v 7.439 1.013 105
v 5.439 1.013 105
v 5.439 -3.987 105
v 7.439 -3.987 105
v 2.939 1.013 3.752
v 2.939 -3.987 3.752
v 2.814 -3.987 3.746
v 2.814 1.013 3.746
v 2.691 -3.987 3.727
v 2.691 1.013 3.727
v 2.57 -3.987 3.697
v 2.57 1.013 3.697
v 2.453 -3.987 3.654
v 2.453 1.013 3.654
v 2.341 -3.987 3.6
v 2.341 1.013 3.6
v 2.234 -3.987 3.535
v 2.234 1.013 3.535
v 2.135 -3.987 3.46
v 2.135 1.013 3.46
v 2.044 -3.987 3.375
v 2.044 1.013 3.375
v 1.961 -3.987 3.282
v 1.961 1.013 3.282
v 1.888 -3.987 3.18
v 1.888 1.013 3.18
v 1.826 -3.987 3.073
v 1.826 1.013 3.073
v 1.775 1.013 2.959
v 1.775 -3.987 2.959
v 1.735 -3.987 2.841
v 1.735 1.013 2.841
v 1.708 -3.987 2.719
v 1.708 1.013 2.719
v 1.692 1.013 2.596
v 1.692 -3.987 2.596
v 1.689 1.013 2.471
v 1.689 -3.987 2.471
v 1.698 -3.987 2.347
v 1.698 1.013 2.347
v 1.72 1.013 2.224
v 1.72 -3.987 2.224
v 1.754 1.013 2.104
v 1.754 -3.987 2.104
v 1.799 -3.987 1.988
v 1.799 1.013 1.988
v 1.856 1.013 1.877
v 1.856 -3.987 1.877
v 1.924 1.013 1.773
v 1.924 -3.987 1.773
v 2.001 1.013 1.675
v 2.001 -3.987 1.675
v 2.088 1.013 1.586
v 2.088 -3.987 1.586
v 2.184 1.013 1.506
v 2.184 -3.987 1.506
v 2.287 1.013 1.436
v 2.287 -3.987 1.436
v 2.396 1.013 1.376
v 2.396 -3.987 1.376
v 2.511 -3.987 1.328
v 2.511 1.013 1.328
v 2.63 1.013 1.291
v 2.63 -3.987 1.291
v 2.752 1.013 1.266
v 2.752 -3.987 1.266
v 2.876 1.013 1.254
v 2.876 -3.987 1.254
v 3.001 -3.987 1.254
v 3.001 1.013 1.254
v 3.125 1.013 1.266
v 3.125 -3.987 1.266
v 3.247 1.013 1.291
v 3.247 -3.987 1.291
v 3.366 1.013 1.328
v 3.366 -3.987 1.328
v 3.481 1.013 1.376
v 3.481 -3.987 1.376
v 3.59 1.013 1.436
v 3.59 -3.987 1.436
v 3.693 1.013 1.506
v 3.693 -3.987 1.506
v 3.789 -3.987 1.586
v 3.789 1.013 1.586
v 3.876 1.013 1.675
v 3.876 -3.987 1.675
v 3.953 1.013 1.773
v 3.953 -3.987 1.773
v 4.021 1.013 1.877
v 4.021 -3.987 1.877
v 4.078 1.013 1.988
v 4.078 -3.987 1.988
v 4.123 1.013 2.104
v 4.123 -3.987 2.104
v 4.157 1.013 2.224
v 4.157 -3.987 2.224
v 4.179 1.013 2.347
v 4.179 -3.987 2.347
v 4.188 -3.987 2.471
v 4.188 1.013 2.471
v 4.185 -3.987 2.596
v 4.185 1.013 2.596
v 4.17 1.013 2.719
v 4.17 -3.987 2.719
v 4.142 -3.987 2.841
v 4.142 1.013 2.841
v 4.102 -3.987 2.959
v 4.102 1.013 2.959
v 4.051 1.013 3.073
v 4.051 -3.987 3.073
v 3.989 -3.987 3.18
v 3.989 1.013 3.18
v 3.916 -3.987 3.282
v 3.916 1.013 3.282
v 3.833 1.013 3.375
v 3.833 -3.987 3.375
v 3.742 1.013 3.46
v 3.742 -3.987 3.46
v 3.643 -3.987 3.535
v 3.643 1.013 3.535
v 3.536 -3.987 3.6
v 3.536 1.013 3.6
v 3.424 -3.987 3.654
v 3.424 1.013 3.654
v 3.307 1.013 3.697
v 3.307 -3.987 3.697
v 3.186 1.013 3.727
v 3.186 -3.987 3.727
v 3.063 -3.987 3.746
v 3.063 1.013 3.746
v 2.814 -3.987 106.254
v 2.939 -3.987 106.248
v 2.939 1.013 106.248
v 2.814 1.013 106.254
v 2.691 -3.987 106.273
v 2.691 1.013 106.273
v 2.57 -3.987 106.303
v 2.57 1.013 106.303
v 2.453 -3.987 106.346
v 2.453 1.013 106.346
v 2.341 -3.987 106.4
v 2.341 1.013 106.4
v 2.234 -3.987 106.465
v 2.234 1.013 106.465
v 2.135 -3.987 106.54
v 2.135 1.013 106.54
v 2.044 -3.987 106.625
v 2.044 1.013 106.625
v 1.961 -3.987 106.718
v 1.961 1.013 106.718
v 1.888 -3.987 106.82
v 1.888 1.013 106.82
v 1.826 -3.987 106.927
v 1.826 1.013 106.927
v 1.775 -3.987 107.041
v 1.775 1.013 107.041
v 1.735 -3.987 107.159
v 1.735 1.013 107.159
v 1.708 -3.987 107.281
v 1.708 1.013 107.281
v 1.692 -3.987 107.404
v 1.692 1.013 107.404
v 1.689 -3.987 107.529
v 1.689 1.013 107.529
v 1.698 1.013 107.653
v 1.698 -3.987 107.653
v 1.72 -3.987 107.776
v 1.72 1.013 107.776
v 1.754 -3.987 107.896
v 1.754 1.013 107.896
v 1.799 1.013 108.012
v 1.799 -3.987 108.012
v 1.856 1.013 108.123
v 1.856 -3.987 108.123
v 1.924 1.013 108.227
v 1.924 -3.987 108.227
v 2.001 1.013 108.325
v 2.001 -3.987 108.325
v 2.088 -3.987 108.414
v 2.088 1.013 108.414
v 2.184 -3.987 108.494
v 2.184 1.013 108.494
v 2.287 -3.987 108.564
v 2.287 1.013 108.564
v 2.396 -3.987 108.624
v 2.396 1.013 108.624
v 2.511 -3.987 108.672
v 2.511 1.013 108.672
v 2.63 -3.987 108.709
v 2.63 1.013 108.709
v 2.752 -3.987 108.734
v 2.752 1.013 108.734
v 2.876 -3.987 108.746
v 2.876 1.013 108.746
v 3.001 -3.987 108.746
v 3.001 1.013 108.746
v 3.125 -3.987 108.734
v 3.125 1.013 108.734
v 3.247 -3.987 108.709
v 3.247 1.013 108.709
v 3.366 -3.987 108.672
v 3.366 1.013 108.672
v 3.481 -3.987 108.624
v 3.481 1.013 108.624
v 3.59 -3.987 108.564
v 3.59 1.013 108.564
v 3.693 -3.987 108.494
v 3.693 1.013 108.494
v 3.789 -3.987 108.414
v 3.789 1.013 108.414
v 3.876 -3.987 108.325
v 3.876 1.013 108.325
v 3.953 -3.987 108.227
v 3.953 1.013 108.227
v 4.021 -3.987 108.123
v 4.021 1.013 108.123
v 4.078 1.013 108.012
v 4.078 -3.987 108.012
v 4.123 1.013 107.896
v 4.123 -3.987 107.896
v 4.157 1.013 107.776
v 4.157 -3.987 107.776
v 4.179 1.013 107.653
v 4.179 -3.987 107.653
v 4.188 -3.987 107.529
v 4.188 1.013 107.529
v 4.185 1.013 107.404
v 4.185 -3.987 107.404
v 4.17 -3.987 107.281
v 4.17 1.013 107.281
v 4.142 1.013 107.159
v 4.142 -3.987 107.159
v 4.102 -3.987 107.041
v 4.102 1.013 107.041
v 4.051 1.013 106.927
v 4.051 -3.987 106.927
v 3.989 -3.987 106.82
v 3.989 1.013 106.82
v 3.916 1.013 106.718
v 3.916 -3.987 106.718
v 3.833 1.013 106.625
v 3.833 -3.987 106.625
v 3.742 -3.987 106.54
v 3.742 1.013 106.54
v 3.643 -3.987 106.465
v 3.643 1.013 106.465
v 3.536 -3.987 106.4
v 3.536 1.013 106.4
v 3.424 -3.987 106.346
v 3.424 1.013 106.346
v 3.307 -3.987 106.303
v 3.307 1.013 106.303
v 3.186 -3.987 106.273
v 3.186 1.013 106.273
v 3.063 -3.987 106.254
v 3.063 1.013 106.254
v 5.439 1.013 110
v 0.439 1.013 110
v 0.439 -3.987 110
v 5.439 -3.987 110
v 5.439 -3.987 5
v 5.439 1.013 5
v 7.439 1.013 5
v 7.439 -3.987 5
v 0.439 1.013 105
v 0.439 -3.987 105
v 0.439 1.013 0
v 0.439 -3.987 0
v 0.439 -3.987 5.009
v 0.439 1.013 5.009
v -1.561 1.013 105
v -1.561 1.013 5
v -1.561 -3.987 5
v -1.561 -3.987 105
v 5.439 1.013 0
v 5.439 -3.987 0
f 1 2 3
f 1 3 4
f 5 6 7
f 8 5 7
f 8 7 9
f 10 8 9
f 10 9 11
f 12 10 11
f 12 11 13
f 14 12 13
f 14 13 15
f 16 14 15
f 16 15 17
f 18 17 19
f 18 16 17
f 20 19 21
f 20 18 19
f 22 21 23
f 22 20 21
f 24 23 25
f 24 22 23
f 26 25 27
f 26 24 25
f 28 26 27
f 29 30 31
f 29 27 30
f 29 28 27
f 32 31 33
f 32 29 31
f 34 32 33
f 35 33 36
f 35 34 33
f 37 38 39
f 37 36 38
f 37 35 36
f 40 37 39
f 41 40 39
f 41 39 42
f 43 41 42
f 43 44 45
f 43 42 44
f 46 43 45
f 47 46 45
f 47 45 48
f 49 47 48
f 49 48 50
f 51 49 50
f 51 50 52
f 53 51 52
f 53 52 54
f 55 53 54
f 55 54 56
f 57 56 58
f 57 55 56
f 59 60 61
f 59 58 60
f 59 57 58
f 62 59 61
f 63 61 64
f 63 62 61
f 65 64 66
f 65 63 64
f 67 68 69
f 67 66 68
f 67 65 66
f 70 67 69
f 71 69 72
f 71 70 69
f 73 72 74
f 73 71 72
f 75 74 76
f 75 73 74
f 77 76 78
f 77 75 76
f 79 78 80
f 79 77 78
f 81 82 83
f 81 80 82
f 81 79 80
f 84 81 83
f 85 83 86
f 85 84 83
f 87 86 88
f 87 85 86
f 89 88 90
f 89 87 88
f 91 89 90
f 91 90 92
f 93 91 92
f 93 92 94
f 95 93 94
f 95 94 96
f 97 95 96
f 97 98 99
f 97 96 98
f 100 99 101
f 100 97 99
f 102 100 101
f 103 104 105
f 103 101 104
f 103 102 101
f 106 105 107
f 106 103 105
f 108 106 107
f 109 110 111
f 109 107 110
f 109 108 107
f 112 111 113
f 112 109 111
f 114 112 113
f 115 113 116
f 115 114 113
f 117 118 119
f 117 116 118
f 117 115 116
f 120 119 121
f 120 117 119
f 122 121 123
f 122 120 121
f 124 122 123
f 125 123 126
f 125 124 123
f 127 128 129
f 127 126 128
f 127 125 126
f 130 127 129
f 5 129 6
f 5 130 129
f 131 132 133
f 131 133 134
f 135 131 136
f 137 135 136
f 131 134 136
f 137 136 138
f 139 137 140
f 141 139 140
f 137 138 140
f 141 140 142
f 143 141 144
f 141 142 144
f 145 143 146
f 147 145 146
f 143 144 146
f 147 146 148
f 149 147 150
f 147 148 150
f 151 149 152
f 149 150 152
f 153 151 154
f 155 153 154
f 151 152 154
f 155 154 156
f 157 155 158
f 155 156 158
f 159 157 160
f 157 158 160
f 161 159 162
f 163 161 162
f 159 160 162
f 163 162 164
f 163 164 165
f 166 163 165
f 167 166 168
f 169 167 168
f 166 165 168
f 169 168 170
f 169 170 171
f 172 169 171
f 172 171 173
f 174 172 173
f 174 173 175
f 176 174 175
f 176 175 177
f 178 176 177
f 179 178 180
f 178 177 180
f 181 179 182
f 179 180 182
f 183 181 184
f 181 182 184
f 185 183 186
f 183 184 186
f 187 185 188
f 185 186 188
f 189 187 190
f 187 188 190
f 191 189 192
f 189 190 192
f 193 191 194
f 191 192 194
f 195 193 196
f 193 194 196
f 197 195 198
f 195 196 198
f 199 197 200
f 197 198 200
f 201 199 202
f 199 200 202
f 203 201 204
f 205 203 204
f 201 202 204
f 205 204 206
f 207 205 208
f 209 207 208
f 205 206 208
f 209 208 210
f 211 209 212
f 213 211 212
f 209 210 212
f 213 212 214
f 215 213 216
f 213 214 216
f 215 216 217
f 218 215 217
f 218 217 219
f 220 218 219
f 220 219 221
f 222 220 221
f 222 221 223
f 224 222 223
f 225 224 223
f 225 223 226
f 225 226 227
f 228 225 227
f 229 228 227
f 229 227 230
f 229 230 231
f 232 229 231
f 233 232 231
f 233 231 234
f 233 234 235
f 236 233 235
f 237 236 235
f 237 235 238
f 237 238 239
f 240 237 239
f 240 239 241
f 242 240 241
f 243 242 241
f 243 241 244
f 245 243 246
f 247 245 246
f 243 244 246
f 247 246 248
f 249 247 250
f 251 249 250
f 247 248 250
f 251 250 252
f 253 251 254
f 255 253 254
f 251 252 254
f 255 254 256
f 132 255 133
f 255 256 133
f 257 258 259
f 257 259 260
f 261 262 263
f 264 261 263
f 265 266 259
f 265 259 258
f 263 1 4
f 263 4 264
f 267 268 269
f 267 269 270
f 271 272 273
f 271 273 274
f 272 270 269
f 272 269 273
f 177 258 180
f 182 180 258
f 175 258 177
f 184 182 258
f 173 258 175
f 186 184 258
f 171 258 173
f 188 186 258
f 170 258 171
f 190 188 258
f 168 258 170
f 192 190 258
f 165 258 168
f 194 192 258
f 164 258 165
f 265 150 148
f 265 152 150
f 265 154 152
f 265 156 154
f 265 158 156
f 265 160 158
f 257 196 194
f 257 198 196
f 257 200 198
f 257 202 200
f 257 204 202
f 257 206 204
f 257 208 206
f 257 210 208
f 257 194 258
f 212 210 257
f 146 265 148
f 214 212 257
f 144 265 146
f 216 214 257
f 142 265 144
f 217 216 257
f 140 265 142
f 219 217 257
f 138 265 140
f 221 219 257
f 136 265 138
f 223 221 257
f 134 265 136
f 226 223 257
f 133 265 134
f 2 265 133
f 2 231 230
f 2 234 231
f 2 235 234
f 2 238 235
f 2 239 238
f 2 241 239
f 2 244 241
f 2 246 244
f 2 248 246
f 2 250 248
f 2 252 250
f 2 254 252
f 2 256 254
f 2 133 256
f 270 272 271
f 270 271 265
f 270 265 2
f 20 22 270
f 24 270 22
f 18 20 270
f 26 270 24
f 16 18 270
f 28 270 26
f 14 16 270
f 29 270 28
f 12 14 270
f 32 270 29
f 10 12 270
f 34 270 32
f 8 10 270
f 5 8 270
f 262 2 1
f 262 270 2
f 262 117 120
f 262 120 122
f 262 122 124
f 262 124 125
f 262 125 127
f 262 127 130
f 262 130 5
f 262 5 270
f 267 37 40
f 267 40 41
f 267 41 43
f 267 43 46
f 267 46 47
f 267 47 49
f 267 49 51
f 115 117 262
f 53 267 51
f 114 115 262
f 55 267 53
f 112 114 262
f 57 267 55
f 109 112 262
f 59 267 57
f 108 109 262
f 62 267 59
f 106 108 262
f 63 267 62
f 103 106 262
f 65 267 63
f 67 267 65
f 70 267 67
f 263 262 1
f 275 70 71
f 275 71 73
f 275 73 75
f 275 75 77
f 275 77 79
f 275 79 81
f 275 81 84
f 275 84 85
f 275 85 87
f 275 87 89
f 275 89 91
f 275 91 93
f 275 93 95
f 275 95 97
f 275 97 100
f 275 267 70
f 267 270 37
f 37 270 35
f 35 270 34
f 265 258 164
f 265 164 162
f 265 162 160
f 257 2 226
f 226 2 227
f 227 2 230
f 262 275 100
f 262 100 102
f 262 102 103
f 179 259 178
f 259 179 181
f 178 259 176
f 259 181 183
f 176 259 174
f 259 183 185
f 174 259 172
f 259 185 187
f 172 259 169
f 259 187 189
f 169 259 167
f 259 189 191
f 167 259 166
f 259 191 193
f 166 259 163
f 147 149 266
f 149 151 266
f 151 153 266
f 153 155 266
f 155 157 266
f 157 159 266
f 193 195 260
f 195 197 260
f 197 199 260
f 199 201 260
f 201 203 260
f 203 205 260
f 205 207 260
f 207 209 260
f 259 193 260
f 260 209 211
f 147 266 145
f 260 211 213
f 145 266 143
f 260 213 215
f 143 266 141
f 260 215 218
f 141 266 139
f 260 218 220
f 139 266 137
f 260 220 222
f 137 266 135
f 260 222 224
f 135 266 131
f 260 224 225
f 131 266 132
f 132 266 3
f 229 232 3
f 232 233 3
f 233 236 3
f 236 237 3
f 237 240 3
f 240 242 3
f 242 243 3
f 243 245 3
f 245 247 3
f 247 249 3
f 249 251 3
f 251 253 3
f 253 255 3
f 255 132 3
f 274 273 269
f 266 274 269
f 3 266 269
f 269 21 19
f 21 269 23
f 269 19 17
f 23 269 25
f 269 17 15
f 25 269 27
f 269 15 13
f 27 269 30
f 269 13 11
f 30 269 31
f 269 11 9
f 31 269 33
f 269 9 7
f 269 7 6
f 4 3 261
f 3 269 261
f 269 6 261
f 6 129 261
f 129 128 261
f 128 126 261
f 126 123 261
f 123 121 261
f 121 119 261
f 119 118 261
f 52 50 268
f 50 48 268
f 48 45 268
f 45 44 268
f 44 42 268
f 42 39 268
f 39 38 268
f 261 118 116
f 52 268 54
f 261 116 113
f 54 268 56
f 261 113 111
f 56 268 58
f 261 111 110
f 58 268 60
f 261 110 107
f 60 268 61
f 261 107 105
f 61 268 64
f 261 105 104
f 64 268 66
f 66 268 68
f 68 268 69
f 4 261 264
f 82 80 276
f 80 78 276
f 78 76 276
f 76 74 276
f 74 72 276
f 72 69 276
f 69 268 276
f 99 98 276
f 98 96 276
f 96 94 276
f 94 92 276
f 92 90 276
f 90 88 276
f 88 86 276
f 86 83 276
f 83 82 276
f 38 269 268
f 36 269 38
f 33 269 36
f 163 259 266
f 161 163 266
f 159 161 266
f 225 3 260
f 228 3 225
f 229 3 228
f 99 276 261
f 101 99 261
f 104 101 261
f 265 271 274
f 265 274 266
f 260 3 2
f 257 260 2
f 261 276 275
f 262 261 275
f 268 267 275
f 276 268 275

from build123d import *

# Parameters (mm, degrees)
SKETCH1_W           = 5
SKETCH1_H           = 5
BOSS_EXTRUDE1_DEPTH = 110
SKETCH2_W           = 2
SKETCH2_H           = 100
BOSS_EXTRUDE2_DEPTH = 5
BOSS_EXTRUDE3_DEPTH = 5


with BuildPart() as part:
    # Sketch1 → Boss-Extrude1 (new body)
    with BuildSketch(Plane.XY):
        with Locations((2.938510718, -1.487078427)):
            Rectangle(SKETCH1_W, SKETCH1_H)
    extrude(amount=BOSS_EXTRUDE1_DEPTH)

    # Sketch2 → Boss-Extrude2 (add)
    with BuildSketch(Plane(origin=(0, 1.012921573, 0), x_dir=(1, 0, 0), z_dir=(0, 1, 0))):
        with Locations((6.438510718, -55)):
            Rectangle(SKETCH2_W, SKETCH2_H)
    extrude(amount=-BOSS_EXTRUDE2_DEPTH)

    # Sketch3 → Boss-Extrude3 (add)
    with BuildSketch(Plane(origin=(0, 1.012921573, 0), x_dir=(1, 0, 0), z_dir=(0, 1, 0))):
        Polygon((0.438510718, -5.009089169), (-1.561489282, -5), (-1.561489282, -105), (0.438510718, -105), align=None)
    extrude(amount=-BOSS_EXTRUDE3_DEPTH)

    # Sketch6 → M3 Tapped Hole1 (revolve, cut)
    with BuildSketch(Plane(origin=(2.938510718, 1.012921573, 2.502272292), x_dir=(0, 0, 1), z_dir=(1, 0, 0))):
        Polygon((0, 0), (0, 8.751075774), (1.25, 8), (1.25, 0), align=None)
    m3_tapped_hole1 = revolve(axis=Axis((2.938510718, 7.362921573, 2.502272292), (0, -1, 0)), mode=Mode.SUBTRACT)

    # Mirror1: M3 Tapped Hole1 across plane
    add(m3_tapped_hole1.mirror(Plane(origin=(0, 0, 55), x_dir=(1, 0, 0), z_dir=(0, 0, -1))), mode=Mode.SUBTRACT)


solid = part.part
